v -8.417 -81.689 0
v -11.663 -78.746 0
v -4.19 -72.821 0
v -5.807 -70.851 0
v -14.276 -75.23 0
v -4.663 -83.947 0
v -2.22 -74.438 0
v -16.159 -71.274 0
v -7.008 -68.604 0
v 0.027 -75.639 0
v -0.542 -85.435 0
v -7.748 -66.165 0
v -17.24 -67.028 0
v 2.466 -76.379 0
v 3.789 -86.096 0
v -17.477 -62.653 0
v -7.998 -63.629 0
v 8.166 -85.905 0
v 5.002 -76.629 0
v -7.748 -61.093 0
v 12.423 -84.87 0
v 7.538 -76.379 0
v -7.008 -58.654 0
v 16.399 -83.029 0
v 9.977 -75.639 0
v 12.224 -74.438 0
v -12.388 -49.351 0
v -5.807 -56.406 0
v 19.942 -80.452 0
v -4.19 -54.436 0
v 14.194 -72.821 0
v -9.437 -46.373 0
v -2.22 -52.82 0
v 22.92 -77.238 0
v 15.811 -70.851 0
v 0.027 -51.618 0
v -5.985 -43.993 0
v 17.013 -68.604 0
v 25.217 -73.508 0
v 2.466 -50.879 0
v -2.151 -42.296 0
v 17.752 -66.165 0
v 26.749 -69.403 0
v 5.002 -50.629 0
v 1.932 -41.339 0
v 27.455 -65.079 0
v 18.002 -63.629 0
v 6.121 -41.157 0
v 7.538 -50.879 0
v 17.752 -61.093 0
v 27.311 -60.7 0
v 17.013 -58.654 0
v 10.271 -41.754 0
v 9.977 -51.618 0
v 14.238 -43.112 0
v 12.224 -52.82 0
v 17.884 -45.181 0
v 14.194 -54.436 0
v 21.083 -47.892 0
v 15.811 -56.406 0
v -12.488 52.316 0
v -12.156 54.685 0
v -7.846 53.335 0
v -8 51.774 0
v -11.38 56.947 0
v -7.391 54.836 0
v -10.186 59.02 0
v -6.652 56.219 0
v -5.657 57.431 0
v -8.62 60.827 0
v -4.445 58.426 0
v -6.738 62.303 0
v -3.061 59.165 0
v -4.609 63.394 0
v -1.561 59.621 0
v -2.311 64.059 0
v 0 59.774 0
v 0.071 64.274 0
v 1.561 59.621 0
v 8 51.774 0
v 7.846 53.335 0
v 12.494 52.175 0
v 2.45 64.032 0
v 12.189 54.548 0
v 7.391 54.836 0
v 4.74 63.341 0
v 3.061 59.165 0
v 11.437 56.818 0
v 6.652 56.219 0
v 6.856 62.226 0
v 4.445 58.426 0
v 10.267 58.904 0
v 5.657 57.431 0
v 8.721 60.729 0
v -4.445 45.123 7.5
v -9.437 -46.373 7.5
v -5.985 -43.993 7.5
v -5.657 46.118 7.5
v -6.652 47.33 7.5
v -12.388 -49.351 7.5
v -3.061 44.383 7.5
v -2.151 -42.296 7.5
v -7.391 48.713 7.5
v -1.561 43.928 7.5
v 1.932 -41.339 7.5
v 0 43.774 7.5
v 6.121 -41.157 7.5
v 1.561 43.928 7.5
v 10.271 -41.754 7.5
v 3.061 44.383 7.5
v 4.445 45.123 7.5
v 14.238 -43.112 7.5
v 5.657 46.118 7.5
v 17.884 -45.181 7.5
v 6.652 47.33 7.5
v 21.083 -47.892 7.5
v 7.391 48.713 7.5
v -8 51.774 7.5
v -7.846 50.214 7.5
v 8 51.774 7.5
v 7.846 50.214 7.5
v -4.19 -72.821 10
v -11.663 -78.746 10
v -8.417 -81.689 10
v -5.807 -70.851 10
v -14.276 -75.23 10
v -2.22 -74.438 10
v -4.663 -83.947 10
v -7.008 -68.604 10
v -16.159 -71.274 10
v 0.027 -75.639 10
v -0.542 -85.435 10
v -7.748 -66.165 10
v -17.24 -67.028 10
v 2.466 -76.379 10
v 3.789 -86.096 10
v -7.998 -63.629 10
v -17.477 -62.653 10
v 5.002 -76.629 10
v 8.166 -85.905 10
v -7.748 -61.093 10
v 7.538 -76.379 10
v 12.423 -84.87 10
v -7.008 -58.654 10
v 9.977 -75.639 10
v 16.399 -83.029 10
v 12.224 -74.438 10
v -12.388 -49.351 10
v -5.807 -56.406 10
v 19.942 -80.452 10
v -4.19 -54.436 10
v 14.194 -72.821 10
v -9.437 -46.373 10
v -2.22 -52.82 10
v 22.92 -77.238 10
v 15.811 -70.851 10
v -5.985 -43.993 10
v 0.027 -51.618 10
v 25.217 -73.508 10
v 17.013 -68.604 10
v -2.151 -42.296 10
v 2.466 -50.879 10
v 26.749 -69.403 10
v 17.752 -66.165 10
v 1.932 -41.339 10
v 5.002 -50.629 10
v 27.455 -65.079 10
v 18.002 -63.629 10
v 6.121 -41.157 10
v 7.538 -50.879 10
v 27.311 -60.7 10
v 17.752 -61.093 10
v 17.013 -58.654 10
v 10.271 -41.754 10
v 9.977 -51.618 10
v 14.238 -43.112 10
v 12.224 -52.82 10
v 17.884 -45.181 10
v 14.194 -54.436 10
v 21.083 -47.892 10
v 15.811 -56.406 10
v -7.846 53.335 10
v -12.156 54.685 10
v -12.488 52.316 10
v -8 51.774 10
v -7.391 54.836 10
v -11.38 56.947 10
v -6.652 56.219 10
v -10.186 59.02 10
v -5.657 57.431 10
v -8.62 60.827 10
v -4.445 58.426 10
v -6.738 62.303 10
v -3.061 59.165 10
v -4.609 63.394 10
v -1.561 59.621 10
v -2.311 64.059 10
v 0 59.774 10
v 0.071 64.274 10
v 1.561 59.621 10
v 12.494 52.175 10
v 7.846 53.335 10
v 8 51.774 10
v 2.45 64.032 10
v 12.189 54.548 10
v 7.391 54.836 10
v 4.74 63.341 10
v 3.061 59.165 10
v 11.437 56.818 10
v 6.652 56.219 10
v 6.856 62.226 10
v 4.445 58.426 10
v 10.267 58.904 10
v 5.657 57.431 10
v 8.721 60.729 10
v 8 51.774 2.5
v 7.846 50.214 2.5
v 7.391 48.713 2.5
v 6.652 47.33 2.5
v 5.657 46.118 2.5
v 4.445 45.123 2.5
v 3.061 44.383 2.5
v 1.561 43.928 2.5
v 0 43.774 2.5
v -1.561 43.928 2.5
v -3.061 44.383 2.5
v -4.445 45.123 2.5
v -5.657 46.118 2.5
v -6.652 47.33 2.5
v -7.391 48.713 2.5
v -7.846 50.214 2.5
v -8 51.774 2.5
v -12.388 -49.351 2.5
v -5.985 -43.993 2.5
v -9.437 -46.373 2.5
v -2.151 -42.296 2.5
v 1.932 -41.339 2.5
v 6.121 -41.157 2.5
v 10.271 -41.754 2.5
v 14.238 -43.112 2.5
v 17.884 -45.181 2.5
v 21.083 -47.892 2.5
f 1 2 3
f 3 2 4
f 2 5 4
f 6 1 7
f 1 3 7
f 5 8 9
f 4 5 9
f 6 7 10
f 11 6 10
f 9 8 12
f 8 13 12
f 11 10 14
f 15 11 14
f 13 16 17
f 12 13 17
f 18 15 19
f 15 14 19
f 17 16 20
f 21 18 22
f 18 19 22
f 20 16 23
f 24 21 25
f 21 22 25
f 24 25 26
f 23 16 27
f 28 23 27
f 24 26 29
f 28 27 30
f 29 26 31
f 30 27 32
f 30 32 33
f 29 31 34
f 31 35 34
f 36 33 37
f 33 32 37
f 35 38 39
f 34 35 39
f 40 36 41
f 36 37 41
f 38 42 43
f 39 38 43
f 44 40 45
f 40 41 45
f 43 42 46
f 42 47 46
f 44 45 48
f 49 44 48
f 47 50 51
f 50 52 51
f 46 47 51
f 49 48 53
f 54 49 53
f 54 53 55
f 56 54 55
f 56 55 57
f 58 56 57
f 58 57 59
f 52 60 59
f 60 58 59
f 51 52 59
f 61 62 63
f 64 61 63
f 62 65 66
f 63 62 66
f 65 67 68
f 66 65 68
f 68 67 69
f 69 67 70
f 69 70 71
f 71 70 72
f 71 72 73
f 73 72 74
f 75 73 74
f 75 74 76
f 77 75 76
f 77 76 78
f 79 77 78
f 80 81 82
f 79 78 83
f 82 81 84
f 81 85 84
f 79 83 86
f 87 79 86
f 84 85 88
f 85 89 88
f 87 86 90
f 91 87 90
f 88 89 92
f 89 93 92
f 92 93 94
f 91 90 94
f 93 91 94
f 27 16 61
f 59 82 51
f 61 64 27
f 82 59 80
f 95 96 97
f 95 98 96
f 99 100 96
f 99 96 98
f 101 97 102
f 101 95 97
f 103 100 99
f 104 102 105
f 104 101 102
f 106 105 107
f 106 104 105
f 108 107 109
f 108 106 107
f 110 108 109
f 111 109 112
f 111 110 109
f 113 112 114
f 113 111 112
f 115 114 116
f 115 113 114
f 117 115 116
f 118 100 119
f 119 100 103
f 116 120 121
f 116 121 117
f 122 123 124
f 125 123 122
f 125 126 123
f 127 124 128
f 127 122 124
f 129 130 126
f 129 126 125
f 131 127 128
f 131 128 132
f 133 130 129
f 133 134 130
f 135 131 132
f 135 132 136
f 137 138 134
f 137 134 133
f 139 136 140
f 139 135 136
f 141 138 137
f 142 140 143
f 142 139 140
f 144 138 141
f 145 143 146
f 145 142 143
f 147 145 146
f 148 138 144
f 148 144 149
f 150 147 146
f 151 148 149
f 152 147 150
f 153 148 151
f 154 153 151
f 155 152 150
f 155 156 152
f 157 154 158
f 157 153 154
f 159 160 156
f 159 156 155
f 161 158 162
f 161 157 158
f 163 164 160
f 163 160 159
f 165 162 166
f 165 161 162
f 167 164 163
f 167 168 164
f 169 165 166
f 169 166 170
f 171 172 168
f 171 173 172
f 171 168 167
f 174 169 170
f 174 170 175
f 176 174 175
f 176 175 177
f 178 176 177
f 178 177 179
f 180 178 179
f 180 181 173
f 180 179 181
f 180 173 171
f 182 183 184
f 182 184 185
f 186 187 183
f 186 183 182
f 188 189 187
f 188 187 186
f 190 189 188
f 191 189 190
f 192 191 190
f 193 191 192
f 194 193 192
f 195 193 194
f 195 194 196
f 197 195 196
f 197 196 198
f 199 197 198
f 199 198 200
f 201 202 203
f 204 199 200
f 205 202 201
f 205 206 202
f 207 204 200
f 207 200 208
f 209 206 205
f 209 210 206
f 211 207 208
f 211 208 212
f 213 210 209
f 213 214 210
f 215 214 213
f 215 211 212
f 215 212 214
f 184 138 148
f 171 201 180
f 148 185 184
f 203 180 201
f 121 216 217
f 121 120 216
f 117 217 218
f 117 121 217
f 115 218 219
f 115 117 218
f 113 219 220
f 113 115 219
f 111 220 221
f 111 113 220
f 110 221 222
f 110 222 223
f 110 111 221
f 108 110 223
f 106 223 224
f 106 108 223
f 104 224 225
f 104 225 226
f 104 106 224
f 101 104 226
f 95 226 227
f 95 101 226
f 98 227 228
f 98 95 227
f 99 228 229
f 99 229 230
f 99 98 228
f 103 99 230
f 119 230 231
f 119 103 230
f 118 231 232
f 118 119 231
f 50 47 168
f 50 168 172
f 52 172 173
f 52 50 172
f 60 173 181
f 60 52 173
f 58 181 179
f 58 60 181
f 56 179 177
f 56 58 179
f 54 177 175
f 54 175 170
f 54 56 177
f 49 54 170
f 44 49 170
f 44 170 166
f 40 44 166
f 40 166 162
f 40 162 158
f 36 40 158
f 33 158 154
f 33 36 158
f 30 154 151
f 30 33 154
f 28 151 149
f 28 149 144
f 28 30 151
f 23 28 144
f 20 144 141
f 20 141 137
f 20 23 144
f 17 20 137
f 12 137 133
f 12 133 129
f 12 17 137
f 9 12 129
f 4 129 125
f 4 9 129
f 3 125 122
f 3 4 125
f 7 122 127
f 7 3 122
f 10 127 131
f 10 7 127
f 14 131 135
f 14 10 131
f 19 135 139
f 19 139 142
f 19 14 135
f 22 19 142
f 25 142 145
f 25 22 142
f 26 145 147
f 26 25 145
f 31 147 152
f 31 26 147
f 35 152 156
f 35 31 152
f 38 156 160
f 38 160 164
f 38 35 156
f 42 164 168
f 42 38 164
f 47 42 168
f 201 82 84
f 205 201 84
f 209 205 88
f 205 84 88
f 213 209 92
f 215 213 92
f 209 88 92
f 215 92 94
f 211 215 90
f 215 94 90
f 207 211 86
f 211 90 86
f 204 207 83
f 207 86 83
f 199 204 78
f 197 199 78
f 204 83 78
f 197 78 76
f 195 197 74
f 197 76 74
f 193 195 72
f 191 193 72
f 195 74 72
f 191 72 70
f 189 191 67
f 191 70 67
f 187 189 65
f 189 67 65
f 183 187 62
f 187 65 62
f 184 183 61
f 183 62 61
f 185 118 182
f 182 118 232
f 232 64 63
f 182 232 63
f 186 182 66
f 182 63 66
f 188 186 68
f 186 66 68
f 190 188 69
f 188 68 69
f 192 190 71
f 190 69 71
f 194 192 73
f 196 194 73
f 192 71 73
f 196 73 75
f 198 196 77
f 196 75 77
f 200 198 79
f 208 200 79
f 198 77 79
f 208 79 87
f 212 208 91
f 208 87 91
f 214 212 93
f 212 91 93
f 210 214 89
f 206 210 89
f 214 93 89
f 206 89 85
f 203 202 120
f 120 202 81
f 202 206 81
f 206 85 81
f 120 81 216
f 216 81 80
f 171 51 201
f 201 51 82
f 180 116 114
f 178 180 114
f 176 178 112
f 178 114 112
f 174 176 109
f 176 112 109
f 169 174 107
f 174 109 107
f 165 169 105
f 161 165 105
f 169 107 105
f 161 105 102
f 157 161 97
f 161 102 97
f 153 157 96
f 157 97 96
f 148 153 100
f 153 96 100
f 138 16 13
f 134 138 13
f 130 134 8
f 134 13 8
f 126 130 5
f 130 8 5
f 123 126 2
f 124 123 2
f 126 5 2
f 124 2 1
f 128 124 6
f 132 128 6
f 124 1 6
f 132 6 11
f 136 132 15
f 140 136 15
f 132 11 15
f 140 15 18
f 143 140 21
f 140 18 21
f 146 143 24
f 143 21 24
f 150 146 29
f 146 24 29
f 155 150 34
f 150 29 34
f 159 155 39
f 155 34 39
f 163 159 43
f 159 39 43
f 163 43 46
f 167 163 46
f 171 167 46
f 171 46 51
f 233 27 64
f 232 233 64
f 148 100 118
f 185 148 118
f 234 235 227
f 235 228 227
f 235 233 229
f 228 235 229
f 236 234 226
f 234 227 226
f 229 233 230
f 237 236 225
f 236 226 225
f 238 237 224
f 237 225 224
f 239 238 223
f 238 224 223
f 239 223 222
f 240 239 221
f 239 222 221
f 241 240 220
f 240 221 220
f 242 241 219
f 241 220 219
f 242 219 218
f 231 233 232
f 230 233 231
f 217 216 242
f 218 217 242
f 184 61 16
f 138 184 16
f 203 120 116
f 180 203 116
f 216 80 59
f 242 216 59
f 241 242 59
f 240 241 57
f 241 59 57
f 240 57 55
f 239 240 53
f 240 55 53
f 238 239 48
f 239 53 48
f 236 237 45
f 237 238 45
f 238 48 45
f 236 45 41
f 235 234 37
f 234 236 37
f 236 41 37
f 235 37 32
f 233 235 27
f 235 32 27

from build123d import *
from build123d.topology import SkipClean

# Parameters (mm, degrees)
SKETCH1_R           = 13
BOSS_EXTRUDE1_DEPTH = 10
BOSS_EXTRUDE2_DEPTH = 2.5


with BuildPart() as part:
    # Sketch1 → Boss-Extrude1 (new body)
    with BuildSketch(Plane.XY):
        with BuildLine():
            ThreePointArc((12.493571176, 52.175265389), (0.070557662, 64.274218072), (-12.488249851, 52.316280347))
            Line((-12.488249851, 52.316280347), (-17.476763734, -62.653355789))
            ThreePointArc((-17.476763734, -62.653355789), (5.982333293, -86.1073463), (27.31069915, -60.700266301))
            Line((27.31069915, -60.700266301), (12.493571176, 52.175265389))
        make_face()
        with Locations((5.002085998, -63.628709437)):
            Circle(SKETCH1_R, mode=Mode.SUBTRACT)
        with BuildLine():
            Line((-12.387834173, -49.351431108), (-8, 51.774417209))
            ThreePointArc((-8, 51.774417209), (0, 59.774417209), (8, 51.774417209))
            Line((8, 51.774417209), (21.083150248, -47.891830059))
            ThreePointArc((21.083150248, -47.891830059), (4.021838702, -41.150072573), (-12.387834173, -49.351431108))
        make_face(mode=Mode.SUBTRACT)
    extrude(amount=BOSS_EXTRUDE1_DEPTH)

    # Sketch2 → Boss-Extrude2 (add, symmetric)
    with SkipClean():  # the faces are left unmerged after this step: merging them gives an invalid solid
        with BuildSketch(Plane.XY.offset(5)):
            with BuildLine():
                ThreePointArc((8, 51.774417209), (0, 43.774417209), (-8, 51.774417209))
                Line((-8, 51.774417209), (-12.387834173, -49.351431108))
                ThreePointArc((-12.387834173, -49.351431108), (4.021838702, -41.150072573), (21.083150248, -47.891830059))
                Line((21.083150248, -47.891830059), (8, 51.774417209))
            make_face()
        extrude(amount=BOSS_EXTRUDE2_DEPTH, both=True)


solid = part.part
